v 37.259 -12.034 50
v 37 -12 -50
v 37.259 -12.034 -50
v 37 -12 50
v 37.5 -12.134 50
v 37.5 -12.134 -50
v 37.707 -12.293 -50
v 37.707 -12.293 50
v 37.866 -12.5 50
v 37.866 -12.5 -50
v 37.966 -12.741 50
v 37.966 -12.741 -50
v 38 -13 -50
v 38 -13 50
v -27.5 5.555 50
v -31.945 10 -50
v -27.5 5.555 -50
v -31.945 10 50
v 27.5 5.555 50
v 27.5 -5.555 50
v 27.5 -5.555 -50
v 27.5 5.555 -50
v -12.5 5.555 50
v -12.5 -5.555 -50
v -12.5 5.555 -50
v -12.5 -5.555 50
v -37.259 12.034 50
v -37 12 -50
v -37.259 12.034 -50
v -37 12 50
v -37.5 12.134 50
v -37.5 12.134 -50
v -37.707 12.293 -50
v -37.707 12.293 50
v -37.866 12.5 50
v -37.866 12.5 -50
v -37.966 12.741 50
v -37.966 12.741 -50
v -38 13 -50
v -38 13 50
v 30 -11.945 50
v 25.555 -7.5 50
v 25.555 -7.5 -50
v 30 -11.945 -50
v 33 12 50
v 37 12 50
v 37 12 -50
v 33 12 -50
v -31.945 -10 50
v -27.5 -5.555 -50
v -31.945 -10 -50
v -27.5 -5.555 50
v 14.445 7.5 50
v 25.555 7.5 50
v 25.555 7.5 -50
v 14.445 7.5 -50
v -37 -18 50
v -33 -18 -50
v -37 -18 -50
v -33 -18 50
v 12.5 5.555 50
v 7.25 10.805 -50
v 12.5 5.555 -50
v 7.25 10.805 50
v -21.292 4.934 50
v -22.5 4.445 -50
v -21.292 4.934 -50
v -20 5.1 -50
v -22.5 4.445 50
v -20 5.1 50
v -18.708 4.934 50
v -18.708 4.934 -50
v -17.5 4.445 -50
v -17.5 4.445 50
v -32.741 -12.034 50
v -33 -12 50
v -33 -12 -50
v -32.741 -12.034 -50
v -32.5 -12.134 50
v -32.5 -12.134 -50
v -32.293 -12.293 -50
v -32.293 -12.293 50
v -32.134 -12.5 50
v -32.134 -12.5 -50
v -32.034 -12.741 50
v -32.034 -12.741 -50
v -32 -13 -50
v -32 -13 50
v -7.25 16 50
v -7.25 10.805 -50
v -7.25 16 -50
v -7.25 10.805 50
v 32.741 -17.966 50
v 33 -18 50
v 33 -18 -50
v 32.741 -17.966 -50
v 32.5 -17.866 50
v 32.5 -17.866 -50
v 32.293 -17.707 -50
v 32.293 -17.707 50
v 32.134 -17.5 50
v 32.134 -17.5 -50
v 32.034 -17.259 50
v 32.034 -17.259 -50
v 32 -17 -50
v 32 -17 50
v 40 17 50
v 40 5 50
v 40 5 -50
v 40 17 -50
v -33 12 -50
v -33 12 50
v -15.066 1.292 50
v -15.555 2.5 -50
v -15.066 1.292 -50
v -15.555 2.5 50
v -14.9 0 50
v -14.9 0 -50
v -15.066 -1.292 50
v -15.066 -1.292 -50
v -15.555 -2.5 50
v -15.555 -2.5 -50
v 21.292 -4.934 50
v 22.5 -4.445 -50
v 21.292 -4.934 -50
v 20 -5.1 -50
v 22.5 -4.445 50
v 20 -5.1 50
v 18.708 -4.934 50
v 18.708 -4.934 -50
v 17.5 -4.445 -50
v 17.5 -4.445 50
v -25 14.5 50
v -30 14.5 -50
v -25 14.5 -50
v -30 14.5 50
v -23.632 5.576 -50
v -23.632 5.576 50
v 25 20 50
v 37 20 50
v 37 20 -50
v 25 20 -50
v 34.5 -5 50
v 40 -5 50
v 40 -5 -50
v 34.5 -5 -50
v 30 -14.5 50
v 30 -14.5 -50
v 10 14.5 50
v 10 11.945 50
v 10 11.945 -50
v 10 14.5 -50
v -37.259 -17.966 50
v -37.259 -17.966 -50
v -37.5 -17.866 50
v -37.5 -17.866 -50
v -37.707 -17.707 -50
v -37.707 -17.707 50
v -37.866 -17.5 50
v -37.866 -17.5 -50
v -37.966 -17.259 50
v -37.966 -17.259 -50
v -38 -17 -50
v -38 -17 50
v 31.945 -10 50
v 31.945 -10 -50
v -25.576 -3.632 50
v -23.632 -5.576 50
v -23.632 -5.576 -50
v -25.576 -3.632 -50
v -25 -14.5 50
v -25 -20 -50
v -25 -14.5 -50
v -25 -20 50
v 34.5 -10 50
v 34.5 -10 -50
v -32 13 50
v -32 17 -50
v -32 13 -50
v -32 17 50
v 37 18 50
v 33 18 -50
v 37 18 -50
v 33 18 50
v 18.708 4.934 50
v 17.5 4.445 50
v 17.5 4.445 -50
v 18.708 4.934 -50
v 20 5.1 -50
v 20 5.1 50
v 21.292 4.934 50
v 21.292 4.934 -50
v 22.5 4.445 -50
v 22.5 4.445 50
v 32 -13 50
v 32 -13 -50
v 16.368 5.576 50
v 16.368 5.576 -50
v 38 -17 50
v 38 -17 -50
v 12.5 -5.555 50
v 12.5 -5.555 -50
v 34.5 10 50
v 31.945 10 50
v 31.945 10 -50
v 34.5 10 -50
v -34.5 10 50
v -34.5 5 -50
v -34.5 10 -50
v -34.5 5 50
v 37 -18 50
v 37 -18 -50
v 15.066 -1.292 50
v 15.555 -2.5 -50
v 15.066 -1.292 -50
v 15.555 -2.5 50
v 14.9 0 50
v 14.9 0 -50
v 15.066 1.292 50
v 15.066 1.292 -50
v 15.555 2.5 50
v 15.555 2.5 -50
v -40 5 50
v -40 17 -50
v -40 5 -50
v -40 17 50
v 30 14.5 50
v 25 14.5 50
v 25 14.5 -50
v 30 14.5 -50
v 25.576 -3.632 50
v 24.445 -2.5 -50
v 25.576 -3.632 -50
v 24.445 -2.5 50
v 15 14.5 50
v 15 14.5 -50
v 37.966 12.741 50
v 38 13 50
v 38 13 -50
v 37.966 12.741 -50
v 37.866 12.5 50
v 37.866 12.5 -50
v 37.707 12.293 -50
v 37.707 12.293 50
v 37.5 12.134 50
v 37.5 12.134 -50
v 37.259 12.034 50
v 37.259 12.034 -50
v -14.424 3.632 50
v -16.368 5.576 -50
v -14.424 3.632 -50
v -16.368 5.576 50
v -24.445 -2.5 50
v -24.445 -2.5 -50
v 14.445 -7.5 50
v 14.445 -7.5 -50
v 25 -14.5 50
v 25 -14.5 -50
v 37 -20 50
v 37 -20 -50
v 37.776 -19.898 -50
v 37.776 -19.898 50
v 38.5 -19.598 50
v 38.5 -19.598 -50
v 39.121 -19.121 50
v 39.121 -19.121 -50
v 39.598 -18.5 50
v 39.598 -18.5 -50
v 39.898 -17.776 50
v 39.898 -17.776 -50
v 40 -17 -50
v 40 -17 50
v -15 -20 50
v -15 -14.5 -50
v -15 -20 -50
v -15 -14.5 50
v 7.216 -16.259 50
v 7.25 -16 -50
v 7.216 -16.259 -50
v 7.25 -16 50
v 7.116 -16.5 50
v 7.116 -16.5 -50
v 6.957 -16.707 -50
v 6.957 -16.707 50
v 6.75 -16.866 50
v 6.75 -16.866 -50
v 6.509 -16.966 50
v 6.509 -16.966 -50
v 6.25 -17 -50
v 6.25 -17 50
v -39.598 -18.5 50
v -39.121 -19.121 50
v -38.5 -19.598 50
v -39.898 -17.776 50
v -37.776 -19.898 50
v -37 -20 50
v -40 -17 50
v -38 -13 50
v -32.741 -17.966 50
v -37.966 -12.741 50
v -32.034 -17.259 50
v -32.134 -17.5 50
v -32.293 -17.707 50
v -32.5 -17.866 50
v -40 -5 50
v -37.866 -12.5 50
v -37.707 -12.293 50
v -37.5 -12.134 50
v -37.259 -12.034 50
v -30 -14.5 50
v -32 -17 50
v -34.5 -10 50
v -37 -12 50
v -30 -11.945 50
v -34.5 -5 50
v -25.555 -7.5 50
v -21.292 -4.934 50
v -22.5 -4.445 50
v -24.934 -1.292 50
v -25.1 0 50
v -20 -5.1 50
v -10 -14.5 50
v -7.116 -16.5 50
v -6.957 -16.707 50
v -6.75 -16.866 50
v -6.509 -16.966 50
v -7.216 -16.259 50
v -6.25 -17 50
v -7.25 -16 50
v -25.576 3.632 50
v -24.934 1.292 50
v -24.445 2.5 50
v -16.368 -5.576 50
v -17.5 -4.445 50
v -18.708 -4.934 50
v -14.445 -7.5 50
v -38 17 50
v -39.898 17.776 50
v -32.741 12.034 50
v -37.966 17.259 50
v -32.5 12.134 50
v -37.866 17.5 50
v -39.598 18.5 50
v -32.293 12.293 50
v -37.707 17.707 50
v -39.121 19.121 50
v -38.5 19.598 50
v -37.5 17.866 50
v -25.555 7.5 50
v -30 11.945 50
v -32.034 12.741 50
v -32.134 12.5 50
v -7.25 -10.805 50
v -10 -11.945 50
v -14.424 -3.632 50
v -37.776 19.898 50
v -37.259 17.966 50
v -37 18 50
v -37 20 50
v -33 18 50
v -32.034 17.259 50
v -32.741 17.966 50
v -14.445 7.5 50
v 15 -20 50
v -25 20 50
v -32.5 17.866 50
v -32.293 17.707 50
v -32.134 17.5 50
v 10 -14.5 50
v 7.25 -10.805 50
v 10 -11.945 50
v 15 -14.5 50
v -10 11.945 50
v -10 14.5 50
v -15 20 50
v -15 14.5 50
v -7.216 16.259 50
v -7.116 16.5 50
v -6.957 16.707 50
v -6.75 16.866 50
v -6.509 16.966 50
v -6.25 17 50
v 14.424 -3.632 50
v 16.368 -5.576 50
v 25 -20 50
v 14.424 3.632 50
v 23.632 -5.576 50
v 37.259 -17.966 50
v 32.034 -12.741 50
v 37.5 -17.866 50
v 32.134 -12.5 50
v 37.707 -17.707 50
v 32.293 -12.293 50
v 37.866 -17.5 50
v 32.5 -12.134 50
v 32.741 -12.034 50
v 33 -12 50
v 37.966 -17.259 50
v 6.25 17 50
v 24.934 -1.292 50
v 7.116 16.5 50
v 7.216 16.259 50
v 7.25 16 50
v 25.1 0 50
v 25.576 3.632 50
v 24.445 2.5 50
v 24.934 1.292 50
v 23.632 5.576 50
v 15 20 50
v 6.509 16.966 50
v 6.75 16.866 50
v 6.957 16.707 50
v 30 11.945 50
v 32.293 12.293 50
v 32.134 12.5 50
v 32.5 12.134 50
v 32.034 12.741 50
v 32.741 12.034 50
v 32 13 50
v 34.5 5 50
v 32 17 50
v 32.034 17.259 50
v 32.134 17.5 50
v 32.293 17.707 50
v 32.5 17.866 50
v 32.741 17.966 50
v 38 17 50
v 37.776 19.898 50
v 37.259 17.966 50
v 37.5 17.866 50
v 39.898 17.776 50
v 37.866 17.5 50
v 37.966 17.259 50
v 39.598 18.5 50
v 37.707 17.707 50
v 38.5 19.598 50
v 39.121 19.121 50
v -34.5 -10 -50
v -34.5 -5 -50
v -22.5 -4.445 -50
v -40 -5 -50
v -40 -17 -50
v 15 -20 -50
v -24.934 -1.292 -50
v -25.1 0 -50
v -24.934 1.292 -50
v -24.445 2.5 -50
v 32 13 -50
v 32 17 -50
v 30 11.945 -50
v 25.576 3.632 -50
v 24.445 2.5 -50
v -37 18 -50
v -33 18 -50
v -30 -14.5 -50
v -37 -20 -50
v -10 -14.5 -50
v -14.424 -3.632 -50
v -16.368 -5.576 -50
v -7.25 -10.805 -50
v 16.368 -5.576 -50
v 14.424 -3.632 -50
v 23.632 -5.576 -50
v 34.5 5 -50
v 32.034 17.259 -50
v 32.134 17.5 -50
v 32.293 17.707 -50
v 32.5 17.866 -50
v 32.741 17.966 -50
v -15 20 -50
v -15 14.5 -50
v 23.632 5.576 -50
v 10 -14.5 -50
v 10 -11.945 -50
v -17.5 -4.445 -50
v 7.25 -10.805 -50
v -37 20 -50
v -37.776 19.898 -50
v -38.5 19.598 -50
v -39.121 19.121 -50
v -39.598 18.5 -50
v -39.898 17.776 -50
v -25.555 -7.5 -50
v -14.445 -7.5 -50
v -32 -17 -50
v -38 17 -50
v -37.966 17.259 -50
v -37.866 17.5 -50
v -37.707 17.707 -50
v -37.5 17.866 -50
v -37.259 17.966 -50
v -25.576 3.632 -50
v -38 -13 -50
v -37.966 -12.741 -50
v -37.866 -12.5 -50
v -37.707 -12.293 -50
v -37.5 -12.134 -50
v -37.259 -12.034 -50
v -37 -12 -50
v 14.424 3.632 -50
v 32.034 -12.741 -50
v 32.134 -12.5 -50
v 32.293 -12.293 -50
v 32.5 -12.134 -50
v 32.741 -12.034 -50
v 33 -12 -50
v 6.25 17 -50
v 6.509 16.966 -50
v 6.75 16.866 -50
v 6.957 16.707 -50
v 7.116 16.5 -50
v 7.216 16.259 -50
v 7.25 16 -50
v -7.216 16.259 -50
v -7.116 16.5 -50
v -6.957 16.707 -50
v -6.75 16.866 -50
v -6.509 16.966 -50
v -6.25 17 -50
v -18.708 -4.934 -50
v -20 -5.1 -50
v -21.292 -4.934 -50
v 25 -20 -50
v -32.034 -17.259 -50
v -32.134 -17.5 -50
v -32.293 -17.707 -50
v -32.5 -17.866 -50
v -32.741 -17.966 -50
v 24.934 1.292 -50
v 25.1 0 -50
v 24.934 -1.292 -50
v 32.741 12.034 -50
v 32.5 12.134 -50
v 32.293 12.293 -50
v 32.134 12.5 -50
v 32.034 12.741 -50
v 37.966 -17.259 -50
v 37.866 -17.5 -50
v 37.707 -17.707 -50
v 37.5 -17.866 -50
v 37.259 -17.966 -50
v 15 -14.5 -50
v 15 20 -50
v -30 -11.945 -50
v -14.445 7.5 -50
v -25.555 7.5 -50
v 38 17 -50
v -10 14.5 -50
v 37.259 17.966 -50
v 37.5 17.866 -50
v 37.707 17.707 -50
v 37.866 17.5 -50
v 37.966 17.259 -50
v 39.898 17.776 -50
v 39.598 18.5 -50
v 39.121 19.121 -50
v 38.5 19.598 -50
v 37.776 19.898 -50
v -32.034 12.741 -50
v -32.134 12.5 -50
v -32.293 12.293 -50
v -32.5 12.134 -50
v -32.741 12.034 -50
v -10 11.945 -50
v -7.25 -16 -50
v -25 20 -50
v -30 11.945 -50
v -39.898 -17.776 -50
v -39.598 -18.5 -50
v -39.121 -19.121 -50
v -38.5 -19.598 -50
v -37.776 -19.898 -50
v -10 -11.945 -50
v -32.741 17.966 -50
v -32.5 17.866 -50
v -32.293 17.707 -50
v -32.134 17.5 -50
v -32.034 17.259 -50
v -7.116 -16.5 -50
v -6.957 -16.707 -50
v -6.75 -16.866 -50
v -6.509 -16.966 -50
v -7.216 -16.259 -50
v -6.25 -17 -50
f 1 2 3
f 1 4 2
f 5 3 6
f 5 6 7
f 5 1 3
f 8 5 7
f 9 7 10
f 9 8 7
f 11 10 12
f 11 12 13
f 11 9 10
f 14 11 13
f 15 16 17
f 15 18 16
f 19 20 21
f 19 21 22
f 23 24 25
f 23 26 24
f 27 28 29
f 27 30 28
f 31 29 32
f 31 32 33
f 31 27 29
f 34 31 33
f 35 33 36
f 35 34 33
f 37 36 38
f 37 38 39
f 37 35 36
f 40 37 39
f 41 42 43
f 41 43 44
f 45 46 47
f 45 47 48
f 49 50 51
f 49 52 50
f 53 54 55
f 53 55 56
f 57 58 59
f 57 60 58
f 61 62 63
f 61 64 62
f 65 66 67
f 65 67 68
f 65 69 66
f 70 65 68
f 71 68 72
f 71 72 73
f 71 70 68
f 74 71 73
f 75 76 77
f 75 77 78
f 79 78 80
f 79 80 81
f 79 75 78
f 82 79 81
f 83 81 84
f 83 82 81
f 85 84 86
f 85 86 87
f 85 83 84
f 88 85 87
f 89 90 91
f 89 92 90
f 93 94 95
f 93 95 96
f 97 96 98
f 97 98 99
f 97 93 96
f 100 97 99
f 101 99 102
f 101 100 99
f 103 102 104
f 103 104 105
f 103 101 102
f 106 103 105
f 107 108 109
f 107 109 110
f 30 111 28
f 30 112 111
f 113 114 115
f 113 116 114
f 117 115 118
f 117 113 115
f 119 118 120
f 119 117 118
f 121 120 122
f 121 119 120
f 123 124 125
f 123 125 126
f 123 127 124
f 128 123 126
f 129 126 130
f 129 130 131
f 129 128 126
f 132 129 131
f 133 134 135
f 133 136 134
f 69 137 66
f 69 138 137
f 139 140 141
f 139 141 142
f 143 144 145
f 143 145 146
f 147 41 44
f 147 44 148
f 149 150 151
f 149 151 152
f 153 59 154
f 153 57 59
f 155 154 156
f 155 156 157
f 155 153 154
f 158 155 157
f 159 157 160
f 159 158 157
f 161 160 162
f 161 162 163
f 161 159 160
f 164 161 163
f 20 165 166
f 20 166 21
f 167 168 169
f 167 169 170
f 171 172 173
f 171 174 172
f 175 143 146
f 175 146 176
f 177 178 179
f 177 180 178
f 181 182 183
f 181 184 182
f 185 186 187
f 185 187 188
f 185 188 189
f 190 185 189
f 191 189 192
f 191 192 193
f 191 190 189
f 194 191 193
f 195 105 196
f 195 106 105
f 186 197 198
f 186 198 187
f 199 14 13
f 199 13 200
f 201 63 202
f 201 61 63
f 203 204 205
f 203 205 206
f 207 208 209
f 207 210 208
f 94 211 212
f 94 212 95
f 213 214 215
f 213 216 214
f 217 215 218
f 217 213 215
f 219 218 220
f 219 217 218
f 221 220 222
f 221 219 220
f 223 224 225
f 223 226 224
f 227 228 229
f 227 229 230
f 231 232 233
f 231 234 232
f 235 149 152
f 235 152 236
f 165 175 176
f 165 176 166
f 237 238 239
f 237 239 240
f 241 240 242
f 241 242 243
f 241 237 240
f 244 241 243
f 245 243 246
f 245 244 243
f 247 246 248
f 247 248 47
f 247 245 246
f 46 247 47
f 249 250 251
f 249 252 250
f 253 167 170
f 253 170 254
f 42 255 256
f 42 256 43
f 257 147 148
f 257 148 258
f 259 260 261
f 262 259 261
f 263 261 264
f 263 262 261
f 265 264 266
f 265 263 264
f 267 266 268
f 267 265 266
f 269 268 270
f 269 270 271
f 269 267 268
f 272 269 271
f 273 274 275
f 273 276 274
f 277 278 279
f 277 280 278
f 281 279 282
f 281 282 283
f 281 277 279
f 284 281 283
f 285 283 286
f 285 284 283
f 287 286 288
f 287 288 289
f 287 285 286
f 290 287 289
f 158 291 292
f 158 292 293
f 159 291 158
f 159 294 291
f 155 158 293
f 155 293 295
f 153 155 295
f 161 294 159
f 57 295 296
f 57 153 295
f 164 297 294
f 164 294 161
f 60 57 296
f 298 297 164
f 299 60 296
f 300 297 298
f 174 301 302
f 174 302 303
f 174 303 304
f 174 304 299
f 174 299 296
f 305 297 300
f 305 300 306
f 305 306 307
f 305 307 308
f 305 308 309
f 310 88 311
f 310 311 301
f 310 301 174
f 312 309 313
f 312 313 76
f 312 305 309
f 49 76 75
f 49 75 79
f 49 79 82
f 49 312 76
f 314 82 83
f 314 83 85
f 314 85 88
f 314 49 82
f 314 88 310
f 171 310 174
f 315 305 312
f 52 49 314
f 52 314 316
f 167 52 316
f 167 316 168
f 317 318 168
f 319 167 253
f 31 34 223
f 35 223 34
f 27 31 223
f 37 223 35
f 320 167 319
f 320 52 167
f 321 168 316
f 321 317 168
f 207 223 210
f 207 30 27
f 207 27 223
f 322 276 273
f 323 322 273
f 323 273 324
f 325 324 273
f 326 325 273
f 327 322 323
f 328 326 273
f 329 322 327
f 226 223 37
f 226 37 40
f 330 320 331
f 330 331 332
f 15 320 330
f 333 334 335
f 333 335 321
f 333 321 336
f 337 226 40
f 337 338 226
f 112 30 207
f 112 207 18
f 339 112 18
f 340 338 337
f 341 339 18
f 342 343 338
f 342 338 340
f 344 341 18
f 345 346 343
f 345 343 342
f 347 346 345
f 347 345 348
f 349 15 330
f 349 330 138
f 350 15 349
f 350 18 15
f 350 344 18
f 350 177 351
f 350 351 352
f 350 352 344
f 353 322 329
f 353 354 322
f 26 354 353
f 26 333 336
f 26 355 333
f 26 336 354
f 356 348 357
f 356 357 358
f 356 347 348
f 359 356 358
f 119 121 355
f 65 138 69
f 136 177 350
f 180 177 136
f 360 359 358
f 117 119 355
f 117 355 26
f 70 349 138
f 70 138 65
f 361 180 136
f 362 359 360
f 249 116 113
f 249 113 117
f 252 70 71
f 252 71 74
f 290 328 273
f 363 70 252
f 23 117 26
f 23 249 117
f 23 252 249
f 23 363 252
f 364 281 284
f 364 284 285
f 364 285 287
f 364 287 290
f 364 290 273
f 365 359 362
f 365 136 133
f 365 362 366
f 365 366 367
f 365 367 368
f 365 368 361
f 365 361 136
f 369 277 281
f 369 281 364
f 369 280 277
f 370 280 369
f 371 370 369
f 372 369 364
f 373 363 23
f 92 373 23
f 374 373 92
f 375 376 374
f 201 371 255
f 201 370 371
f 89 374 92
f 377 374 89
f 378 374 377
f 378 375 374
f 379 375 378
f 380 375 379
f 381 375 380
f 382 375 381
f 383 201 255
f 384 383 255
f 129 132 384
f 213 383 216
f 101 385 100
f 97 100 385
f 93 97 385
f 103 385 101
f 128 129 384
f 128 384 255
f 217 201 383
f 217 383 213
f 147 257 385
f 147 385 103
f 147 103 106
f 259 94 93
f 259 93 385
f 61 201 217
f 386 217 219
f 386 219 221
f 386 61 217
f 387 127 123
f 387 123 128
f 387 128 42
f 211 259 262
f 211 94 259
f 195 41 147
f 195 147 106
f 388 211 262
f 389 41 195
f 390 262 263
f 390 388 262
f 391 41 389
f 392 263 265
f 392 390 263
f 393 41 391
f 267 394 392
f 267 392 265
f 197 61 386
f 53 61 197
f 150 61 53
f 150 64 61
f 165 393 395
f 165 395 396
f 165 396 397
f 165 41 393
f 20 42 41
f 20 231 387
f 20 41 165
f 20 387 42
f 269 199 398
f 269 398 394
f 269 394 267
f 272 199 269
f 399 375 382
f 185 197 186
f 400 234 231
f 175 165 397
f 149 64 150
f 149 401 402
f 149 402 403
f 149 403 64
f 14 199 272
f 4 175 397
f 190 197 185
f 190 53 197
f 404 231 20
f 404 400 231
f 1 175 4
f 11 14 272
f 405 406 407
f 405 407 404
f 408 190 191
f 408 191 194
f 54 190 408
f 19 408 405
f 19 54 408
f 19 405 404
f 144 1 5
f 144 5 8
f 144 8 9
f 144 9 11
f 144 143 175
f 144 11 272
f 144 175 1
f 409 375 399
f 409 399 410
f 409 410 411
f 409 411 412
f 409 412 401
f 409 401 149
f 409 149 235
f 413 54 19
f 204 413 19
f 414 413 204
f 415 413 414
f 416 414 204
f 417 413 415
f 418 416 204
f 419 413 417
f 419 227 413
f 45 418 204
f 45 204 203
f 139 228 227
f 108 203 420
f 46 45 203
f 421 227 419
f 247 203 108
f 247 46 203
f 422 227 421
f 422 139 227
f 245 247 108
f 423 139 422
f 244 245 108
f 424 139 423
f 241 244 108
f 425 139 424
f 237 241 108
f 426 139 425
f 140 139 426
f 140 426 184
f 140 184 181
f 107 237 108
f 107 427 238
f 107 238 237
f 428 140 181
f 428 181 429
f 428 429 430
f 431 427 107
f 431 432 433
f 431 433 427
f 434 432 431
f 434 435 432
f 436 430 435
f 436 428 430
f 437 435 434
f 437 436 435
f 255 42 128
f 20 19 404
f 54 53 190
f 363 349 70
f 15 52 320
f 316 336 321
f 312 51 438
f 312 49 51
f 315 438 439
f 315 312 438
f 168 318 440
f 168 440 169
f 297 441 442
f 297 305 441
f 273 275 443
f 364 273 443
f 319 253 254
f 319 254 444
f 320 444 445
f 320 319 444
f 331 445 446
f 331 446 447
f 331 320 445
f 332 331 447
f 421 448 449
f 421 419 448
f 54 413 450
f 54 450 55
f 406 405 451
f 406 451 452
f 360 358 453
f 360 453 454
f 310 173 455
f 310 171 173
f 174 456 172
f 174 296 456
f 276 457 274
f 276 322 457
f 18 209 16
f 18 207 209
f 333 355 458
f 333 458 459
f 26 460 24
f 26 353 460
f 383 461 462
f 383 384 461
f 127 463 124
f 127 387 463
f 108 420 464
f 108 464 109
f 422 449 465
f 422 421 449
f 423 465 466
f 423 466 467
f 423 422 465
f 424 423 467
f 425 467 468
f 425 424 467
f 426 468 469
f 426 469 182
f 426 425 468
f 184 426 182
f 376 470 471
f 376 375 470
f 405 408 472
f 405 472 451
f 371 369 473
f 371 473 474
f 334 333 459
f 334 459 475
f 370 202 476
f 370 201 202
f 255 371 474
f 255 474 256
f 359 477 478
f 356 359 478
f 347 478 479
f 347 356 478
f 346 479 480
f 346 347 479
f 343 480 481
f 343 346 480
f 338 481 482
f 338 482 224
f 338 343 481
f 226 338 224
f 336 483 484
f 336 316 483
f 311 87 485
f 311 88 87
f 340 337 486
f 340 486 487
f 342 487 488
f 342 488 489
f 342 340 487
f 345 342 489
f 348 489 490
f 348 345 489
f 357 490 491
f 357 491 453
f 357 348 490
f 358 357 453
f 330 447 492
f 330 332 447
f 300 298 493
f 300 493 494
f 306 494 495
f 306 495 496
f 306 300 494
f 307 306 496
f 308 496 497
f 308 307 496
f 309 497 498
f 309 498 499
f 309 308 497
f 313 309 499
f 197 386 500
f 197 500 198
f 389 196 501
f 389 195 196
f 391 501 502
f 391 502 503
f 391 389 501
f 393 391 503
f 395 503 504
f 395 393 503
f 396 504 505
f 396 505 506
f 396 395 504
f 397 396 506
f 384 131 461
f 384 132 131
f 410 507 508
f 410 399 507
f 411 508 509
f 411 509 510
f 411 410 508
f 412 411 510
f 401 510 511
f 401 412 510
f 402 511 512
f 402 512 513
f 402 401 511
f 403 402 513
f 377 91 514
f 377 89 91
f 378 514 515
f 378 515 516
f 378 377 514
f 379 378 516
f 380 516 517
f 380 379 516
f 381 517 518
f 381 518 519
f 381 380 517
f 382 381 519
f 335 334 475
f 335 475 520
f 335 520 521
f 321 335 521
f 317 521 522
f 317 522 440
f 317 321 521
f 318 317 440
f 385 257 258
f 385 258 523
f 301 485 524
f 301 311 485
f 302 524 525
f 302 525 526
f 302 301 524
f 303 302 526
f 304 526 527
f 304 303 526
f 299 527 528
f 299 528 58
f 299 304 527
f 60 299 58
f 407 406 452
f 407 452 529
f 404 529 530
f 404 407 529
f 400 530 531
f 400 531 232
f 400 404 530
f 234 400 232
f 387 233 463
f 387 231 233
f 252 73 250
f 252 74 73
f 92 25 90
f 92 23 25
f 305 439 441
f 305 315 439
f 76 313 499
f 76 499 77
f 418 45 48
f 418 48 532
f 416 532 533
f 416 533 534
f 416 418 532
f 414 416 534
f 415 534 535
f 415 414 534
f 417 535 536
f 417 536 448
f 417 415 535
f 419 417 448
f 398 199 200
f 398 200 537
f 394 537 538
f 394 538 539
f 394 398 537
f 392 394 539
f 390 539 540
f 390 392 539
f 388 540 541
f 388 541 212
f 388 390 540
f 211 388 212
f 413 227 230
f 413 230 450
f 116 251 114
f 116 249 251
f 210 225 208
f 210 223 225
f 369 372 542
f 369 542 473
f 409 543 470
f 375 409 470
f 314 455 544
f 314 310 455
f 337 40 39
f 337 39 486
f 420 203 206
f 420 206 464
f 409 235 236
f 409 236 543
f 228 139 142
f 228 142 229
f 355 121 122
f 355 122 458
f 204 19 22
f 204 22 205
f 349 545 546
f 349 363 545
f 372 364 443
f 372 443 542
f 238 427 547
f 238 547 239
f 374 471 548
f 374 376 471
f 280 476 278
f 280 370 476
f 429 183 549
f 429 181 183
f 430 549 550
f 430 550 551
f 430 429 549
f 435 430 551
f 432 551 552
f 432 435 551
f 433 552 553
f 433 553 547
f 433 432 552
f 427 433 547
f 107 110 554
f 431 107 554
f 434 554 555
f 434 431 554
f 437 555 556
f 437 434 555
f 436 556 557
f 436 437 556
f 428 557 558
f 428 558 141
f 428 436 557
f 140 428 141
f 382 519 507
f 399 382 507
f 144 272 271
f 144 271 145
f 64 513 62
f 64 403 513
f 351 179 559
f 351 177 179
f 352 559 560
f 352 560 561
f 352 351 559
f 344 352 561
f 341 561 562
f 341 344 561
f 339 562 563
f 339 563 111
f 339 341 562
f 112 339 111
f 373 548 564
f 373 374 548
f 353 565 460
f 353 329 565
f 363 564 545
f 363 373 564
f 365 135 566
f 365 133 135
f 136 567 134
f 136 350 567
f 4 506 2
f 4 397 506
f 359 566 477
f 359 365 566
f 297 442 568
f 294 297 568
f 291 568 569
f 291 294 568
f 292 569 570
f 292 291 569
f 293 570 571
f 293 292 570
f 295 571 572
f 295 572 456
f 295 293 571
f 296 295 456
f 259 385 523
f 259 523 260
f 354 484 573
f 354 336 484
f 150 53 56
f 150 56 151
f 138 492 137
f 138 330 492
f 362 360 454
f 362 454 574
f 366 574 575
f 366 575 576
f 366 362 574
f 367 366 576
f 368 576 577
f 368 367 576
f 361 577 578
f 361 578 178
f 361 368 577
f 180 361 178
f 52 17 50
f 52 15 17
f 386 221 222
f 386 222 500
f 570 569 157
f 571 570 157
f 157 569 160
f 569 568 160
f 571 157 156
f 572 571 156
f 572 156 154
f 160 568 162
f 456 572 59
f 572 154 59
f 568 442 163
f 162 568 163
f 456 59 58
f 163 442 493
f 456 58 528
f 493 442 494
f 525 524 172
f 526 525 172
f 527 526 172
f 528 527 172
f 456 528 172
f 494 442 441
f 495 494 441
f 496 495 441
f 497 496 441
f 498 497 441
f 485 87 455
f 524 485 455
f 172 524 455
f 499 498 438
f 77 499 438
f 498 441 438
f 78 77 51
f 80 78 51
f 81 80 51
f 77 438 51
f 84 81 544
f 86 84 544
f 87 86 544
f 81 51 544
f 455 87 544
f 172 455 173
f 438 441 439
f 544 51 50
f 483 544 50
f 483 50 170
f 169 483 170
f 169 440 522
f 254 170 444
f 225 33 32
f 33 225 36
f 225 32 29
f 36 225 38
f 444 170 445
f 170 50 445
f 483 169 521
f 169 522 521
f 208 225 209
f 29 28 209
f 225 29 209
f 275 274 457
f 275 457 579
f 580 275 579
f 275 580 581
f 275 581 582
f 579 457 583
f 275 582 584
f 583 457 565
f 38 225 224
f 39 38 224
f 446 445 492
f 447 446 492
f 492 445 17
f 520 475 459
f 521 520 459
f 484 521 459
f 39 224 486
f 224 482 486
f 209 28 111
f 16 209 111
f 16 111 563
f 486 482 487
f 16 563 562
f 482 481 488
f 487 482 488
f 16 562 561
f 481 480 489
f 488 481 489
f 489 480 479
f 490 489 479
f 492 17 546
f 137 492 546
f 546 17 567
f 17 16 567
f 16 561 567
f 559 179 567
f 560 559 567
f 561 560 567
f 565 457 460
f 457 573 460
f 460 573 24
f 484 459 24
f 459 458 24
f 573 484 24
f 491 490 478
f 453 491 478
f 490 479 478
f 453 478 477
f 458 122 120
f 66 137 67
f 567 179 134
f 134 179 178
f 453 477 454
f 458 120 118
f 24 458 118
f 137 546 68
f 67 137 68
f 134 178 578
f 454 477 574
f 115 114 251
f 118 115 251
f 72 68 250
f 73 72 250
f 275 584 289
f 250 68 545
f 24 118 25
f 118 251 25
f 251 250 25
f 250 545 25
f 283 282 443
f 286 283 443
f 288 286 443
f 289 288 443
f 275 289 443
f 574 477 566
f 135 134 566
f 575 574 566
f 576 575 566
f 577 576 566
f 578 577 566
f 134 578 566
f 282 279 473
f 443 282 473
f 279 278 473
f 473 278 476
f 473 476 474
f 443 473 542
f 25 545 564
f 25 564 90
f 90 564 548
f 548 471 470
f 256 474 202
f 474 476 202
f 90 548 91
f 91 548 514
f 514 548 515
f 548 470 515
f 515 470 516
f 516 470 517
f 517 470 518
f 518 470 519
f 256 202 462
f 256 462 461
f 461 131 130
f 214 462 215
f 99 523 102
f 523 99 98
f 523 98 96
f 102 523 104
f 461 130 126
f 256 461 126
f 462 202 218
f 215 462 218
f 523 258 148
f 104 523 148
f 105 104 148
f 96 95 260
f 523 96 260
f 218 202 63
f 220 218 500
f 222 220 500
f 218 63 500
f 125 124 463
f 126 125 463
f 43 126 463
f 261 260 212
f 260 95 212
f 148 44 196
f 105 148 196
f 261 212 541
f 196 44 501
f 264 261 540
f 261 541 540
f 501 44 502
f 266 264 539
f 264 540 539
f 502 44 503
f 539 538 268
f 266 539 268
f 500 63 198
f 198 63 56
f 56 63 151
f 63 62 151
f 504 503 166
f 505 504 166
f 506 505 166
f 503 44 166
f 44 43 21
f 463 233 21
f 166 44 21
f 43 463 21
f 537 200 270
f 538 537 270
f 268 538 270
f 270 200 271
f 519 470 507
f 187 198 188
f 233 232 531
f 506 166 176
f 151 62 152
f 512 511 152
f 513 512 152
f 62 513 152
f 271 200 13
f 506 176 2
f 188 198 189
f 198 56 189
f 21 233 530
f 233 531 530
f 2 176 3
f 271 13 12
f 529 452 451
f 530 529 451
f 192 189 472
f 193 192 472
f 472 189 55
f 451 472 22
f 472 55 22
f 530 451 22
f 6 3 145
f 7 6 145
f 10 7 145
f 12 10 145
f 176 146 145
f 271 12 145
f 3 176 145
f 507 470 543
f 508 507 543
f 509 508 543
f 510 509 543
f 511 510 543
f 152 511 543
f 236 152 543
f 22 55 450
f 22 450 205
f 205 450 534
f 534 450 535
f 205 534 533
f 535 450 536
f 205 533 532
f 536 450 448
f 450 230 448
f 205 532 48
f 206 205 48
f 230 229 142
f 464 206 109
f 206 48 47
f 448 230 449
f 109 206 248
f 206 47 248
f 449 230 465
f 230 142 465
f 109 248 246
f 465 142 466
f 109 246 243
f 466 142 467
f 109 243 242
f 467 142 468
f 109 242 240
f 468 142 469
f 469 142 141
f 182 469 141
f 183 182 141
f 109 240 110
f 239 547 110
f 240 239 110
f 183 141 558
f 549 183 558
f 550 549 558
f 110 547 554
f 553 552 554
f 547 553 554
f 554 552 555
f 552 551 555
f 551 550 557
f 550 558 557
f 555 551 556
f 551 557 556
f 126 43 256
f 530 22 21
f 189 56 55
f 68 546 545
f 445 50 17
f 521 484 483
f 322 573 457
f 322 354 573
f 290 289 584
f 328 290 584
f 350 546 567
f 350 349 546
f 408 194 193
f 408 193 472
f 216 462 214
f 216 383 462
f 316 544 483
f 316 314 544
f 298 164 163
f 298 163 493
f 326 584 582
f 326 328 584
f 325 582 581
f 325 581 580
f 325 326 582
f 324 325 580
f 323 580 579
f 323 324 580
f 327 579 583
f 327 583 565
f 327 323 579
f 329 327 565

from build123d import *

# Parameters (mm, degrees)
BOSS_EXTRUDE1_DEPTH = 50


with BuildPart() as part:
    # Sketch1 → Boss-Extrude1 (new, symmetric)
    with BuildSketch(Plane.XY):
        with BuildLine():
            Line((-15, -20), (15, -20))
            Line((15, -20), (15, -14.5))
            Line((15, -14.5), (10, -14.5))
            Line((10, -14.5), (10, -11.944543648))
            Line((10, -11.944543648), (14.444543648, -7.5))
            Line((14.444543648, -7.5), (25.555456352, -7.5))
            Line((25.555456352, -7.5), (30, -11.944543648))
            Line((30, -11.944543648), (30, -14.5))
            Line((30, -14.5), (25, -14.5))
            Line((25, -14.5), (25, -20))
            Line((25, -20), (37, -20))
            ThreePointArc((37, -20), (39.121320344, -19.121320344), (40, -17))
            Line((40, -17), (40, -5))
            Line((40, -5), (34.5, -5))
            Line((34.5, -5), (34.5, -10))
            Line((34.5, -10), (31.944543648, -10))
            Line((31.944543648, -10), (27.5, -5.555456352))
            Line((27.5, -5.555456352), (27.5, 5.555456352))
            Line((27.5, 5.555456352), (31.944543648, 10))
            Line((31.944543648, 10), (34.5, 10))
            Line((34.5, 10), (34.5, 5))
            Line((34.5, 5), (40, 5))
            Line((40, 5), (40, 17))
            ThreePointArc((40, 17), (39.121320344, 19.121320344), (37, 20))
            Line((37, 20), (25, 20))
            Line((25, 20), (25, 14.5))
            Line((25, 14.5), (30, 14.5))
            Line((30, 14.5), (30, 11.944543648))
            Line((30, 11.944543648), (25.555456352, 7.5))
            Line((25.555456352, 7.5), (14.444543648, 7.5))
            Line((14.444543648, 7.5), (10, 11.944543648))
            Line((10, 11.944543648), (10, 14.5))
            Line((10, 14.5), (15, 14.5))
            Line((15, 14.5), (15, 20))
            Line((15, 20), (-15, 20))
            Line((-15, 20), (-15, 14.5))
            Line((-15, 14.5), (-10, 14.5))
            Line((-10, 14.5), (-10, 11.944543648))
            Line((-10, 11.944543648), (-14.444543648, 7.5))
            Line((-14.444543648, 7.5), (-25.555456352, 7.5))
            Line((-25.555456352, 7.5), (-30, 11.944543648))
            Line((-30, 11.944543648), (-30, 14.5))
            Line((-30, 14.5), (-25, 14.5))
            Line((-25, 14.5), (-25, 20))
            Line((-25, 20), (-37, 20))
            ThreePointArc((-37, 20), (-39.121320344, 19.121320344), (-40, 17))
            Line((-40, 17), (-40, 5))
            Line((-40, 5), (-34.5, 5))
            Line((-34.5, 5), (-34.5, 10))
            Line((-34.5, 10), (-31.944543648, 10))
            Line((-31.944543648, 10), (-27.5, 5.555456352))
            Line((-27.5, 5.555456352), (-27.5, -5.555456352))
            Line((-27.5, -5.555456352), (-31.944543648, -10))
            Line((-31.944543648, -10), (-34.5, -10))
            Line((-34.5, -10), (-34.5, -5))
            Line((-34.5, -5), (-40, -5))
            Line((-40, -5), (-40, -17))
            ThreePointArc((-40, -17), (-39.121320344, -19.121320344), (-37, -20))
            Line((-37, -20), (-25, -20))
            Line((-25, -20), (-25, -14.5))
            Line((-25, -14.5), (-30, -14.5))
            Line((-30, -14.5), (-30, -11.944543648))
            Line((-30, -11.944543648), (-25.555456352, -7.5))
            Line((-25.555456352, -7.5), (-14.444543648, -7.5))
            Line((-14.444543648, -7.5), (-10, -11.944543648))
            Line((-10, -11.944543648), (-10, -14.5))
            Line((-10, -14.5), (-15, -14.5))
            Line((-15, -14.5), (-15, -20))
        make_face()
        with BuildLine():
            Line((-38, 13), (-38, 17))
            ThreePointArc((-38, 17), (-37.707106781, 17.707106781), (-37, 18))
            Line((-37, 18), (-33, 18))
            ThreePointArc((-33, 18), (-32.292893219, 17.707106781), (-32, 17))
            Line((-32, 17), (-32, 13))
            ThreePointArc((-32, 13), (-32.292893219, 12.292893219), (-33, 12))
            Line((-33, 12), (-37, 12))
            ThreePointArc((-37, 12), (-37.707106781, 12.292893219), (-38, 13))
        make_face(mode=Mode.SUBTRACT)
        with BuildLine():
            Line((-15.555022098, -2.500434253), (-14.423651249, -3.631805103))
            Line((-14.423651249, -3.631805103), (-16.368194897, -5.576348751))
            Line((-16.368194897, -5.576348751), (-17.499565747, -4.444977902))
            ThreePointArc((-17.499565747, -4.444977902), (-20, -5.1), (-22.500434253, -4.444977902))
            Line((-22.500434253, -4.444977902), (-23.631805103, -5.576348751))
            Line((-23.631805103, -5.576348751), (-25.576348751, -3.631805103))
            Line((-25.576348751, -3.631805103), (-24.444977902, -2.500434253))
            ThreePointArc((-24.444977902, -2.500434253), (-25.1, 0), (-24.444977902, 2.500434253))
            Line((-24.444977902, 2.500434253), (-25.576348751, 3.631805103))
            Line((-25.576348751, 3.631805103), (-23.631805103, 5.576348751))
            Line((-23.631805103, 5.576348751), (-22.500434253, 4.444977902))
            ThreePointArc((-22.500434253, 4.444977902), (-20, 5.1), (-17.499565747, 4.444977902))
            Line((-17.499565747, 4.444977902), (-16.368194897, 5.576348751))
            Line((-16.368194897, 5.576348751), (-14.423651249, 3.631805103))
            Line((-14.423651249, 3.631805103), (-15.555022098, 2.500434253))
            ThreePointArc((-15.555022098, 2.500434253), (-14.9, 0), (-15.555022098, -2.500434253))
        make_face(mode=Mode.SUBTRACT)
        with BuildLine():
            Line((-38, -17), (-38, -13))
            ThreePointArc((-38, -13), (-37.707106781, -12.292893219), (-37, -12))
            Line((-37, -12), (-33, -12))
            ThreePointArc((-33, -12), (-32.292893219, -12.292893219), (-32, -13))
            Line((-32, -13), (-32, -17))
            ThreePointArc((-32, -17), (-32.292893219, -17.707106781), (-33, -18))
            Line((-33, -18), (-37, -18))
            ThreePointArc((-37, -18), (-37.707106781, -17.707106781), (-38, -17))
        make_face(mode=Mode.SUBTRACT)
        with BuildLine():
            Line((38, -13), (38, -17))
            ThreePointArc((38, -17), (37.707106781, -17.707106781), (37, -18))
            Line((37, -18), (33, -18))
            ThreePointArc((33, -18), (32.292893219, -17.707106781), (32, -17))
            Line((32, -17), (32, -13))
            ThreePointArc((32, -13), (32.292893219, -12.292893219), (33, -12))
            Line((33, -12), (37, -12))
            ThreePointArc((37, -12), (37.707106781, -12.292893219), (38, -13))
        make_face(mode=Mode.SUBTRACT)
        with BuildLine():
            Line((15.555022098, 2.500434253), (14.423651249, 3.631805103))
            Line((14.423651249, 3.631805103), (16.368194897, 5.576348751))
            Line((16.368194897, 5.576348751), (17.499565747, 4.444977902))
            ThreePointArc((17.499565747, 4.444977902), (20, 5.1), (22.500434253, 4.444977902))
            Line((22.500434253, 4.444977902), (23.631805103, 5.576348751))
            Line((23.631805103, 5.576348751), (25.576348751, 3.631805103))
            Line((25.576348751, 3.631805103), (24.444977902, 2.500434253))
            ThreePointArc((24.444977902, 2.500434253), (25.1, 0), (24.444977902, -2.500434253))
            Line((24.444977902, -2.500434253), (25.576348751, -3.631805103))
            Line((25.576348751, -3.631805103), (23.631805103, -5.576348751))
            Line((23.631805103, -5.576348751), (22.500434253, -4.444977902))
            ThreePointArc((22.500434253, -4.444977902), (20, -5.1), (17.499565747, -4.444977902))
            Line((17.499565747, -4.444977902), (16.368194897, -5.576348751))
            Line((16.368194897, -5.576348751), (14.423651249, -3.631805103))
            Line((14.423651249, -3.631805103), (15.555022098, -2.500434253))
            ThreePointArc((15.555022098, -2.500434253), (14.9, 0), (15.555022098, 2.500434253))
        make_face(mode=Mode.SUBTRACT)
        with BuildLine():
            Line((38, 17), (38, 13))
            ThreePointArc((38, 13), (37.707106781, 12.292893219), (37, 12))
            Line((37, 12), (33, 12))
            ThreePointArc((33, 12), (32.292893219, 12.292893219), (32, 13))
            Line((32, 13), (32, 17))
            ThreePointArc((32, 17), (32.292893219, 17.707106781), (33, 18))
            Line((33, 18), (37, 18))
            ThreePointArc((37, 18), (37.707106781, 17.707106781), (38, 17))
        make_face(mode=Mode.SUBTRACT)
        with BuildLine():
            Line((6.25, -17), (-6.25, -17))
            ThreePointArc((-6.25, -17), (-6.957106781, -16.707106781), (-7.25, -16))
            Line((-7.25, -16), (-7.25, -10.805456352))
            Line((-7.25, -10.805456352), (-12.5, -5.555456352))
            Line((-12.5, -5.555456352), (-12.5, 5.555456352))
            Line((-12.5, 5.555456352), (-7.25, 10.805456352))
            Line((-7.25, 10.805456352), (-7.25, 16))
            ThreePointArc((-7.25, 16), (-6.957106781, 16.707106781), (-6.25, 17))
            Line((-6.25, 17), (6.25, 17))
            ThreePointArc((6.25, 17), (6.957106781, 16.707106781), (7.25, 16))
            Line((7.25, 16), (7.25, 10.805456352))
            Line((7.25, 10.805456352), (12.5, 5.555456352))
            Line((12.5, 5.555456352), (12.5, -5.555456352))
            Line((12.5, -5.555456352), (7.25, -10.805456352))
            Line((7.25, -10.805456352), (7.25, -16))
            ThreePointArc((7.25, -16), (6.957106781, -16.707106781), (6.25, -17))
        make_face(mode=Mode.SUBTRACT)
    extrude(amount=BOSS_EXTRUDE1_DEPTH, both=True)


solid = part.part
